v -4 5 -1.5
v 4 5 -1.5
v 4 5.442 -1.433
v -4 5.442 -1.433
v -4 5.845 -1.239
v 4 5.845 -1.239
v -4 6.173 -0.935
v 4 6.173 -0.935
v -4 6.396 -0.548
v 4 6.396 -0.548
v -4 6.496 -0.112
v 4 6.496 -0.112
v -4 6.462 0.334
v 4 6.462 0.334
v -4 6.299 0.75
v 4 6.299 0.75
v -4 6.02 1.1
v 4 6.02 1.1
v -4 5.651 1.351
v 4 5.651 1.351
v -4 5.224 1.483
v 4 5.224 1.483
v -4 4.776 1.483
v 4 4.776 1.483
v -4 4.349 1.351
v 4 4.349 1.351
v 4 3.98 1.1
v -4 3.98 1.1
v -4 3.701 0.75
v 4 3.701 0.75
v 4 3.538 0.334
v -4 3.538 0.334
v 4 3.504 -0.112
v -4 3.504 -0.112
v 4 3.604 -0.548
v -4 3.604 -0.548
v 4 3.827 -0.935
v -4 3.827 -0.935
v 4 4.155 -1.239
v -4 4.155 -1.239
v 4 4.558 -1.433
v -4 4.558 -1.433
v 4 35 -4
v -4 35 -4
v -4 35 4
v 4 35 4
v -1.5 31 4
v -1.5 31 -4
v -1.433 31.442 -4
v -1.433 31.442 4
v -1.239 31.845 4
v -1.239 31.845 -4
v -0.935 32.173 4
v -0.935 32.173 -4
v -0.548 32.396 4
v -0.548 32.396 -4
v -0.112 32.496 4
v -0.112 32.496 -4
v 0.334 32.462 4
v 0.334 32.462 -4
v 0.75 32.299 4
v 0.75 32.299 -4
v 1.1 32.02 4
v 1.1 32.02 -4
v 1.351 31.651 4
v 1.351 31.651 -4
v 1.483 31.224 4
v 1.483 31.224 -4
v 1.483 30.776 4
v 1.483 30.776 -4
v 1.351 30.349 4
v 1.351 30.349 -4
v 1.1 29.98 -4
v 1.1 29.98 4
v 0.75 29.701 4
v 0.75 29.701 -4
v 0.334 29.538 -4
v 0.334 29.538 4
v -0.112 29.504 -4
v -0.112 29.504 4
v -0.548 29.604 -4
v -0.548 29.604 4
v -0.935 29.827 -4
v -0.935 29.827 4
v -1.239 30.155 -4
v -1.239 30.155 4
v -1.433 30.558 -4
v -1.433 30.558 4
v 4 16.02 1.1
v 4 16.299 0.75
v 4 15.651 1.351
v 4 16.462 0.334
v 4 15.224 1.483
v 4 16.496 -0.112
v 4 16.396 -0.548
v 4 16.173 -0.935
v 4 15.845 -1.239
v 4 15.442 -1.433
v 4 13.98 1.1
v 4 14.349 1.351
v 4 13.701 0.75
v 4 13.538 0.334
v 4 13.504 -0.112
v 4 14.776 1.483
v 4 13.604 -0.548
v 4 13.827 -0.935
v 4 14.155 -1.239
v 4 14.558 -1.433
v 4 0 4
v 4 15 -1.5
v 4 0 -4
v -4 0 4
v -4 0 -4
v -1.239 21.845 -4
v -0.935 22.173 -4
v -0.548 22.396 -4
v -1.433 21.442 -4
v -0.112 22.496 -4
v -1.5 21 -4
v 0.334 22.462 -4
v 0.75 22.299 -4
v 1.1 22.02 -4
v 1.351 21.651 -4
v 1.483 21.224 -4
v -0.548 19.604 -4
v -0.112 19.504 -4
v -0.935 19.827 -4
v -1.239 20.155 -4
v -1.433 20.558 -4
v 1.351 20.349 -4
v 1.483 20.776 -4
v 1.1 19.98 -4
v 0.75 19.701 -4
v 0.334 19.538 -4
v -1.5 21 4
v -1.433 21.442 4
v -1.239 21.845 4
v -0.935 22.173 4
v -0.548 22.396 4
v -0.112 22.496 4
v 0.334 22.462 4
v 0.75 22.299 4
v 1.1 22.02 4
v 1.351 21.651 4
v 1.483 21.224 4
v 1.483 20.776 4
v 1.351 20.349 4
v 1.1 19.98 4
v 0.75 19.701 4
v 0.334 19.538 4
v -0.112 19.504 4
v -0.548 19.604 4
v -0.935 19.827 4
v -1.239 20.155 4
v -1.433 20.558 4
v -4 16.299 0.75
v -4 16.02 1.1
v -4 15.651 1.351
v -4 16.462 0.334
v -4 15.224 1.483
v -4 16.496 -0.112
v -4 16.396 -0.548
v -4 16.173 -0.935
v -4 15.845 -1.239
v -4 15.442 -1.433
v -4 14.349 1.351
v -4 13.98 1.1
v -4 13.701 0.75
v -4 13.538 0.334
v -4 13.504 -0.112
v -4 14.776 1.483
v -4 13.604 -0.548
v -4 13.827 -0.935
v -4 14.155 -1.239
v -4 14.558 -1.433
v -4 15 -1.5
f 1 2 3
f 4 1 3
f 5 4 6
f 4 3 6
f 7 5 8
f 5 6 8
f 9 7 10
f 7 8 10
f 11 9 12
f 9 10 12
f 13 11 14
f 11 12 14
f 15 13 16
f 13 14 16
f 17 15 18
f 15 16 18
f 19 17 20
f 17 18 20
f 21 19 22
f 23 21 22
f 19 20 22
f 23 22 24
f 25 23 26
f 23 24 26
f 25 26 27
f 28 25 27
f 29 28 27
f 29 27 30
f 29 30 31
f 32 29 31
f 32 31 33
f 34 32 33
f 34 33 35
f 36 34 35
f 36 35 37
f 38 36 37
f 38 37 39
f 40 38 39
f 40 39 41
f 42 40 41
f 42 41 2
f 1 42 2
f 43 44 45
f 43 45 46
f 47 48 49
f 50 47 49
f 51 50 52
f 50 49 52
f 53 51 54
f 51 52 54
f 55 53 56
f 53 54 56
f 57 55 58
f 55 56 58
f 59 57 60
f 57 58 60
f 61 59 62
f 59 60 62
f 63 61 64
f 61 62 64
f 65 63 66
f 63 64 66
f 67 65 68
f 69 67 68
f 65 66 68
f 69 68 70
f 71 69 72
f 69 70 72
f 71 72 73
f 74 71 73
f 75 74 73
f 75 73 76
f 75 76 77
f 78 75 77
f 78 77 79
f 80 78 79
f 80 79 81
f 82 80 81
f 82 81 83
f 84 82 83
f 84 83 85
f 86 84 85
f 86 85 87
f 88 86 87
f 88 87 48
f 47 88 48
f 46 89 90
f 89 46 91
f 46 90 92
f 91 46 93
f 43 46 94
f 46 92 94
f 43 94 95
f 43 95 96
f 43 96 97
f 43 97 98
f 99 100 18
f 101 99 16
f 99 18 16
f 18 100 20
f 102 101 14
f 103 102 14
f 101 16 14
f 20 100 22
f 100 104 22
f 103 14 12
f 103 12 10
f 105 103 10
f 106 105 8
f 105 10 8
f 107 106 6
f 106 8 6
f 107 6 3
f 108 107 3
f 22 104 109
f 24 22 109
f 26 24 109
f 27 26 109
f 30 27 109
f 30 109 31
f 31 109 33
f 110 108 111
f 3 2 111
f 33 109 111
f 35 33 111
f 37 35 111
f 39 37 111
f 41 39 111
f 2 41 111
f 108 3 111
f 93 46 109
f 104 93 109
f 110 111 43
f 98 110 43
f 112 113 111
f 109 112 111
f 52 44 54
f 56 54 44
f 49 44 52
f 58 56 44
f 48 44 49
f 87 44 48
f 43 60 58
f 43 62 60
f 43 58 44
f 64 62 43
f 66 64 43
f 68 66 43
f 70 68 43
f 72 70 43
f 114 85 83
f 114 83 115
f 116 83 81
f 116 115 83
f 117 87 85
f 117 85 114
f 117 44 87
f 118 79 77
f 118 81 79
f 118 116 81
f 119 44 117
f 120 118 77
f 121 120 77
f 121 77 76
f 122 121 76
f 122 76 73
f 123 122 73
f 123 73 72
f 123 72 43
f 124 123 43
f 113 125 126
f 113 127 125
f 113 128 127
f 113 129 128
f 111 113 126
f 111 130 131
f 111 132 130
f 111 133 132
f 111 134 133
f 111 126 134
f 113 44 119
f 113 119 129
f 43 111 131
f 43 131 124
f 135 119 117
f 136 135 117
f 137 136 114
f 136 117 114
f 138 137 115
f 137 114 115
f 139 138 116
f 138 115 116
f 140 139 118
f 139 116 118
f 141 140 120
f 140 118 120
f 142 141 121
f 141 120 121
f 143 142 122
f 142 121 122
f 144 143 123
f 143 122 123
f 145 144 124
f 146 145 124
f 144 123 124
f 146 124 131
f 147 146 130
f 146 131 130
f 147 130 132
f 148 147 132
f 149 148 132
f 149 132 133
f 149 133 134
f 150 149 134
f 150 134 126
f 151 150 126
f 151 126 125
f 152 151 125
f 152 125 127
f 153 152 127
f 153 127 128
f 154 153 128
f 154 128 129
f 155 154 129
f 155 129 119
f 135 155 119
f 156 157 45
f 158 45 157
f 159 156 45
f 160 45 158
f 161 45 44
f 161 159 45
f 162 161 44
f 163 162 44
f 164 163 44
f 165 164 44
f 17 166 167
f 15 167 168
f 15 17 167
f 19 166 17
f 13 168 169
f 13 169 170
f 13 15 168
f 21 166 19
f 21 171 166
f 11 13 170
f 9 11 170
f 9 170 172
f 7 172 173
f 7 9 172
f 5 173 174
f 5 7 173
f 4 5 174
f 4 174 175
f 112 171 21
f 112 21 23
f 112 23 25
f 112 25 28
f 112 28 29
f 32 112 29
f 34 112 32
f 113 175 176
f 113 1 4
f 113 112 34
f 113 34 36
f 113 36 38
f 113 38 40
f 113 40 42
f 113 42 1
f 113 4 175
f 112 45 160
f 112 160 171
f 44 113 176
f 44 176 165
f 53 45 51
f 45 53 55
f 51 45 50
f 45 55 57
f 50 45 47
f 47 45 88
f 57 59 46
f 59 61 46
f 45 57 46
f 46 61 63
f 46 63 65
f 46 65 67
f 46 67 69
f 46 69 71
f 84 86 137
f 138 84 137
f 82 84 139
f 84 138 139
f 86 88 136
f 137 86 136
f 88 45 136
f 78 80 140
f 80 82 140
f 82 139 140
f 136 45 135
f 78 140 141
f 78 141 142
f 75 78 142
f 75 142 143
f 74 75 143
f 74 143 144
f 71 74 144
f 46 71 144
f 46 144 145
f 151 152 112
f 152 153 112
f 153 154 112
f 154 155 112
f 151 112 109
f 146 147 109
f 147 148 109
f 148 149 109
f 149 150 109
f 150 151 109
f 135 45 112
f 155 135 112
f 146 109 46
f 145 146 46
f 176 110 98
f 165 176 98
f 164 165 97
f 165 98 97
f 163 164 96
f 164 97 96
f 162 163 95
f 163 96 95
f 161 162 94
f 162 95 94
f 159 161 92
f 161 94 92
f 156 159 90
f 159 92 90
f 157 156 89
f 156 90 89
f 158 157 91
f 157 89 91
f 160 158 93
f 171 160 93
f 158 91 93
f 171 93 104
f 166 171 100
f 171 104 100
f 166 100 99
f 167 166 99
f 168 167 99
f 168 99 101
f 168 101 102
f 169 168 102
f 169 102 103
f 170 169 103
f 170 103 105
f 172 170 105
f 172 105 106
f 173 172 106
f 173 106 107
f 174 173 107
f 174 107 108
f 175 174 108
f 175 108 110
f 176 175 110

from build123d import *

# Parameters (mm, degrees)
SKETCH1_W           = 8
SKETCH1_H           = 8
BOSS_EXTRUDE1_DEPTH = 35
SKETCH2_R           = 1.5
CUT_EXTRUDE1_DEPTH  = 37.124783736
SKETCH3_R           = 1.5
CUT_EXTRUDE2_DEPTH  = 37.124783736


with BuildPart() as part:
    # Sketch1 → Boss-Extrude1 (new body)
    with BuildSketch(Plane(origin=(0, 0, 0), x_dir=(1, 0, 0), z_dir=(0, 1, 0))):
        Rectangle(SKETCH1_W, SKETCH1_H)
    extrude(amount=BOSS_EXTRUDE1_DEPTH)

    # Sketch2 → Cut-Extrude1 (cut, through all)
    with BuildSketch(Plane(origin=(0, 0, -4), x_dir=(-1, 0, 0), z_dir=(0, 0, -1))):
        with Locations((0, 31)):
            Circle(SKETCH2_R)
        with Locations((0, 21)):
            Circle(SKETCH2_R)
    extrude(amount=-CUT_EXTRUDE1_DEPTH, mode=Mode.SUBTRACT)

    # Sketch3 → Cut-Extrude2 (cut, through all)
    with BuildSketch(Plane(origin=(4, 0, 0), x_dir=(0, 0, -1), z_dir=(1, 0, 0))):
        with Locations((0, 15)):
            Circle(SKETCH3_R)
        with Locations((0, 5)):
            Circle(SKETCH3_R)
    extrude(amount=-CUT_EXTRUDE2_DEPTH, mode=Mode.SUBTRACT)


solid = part.part
